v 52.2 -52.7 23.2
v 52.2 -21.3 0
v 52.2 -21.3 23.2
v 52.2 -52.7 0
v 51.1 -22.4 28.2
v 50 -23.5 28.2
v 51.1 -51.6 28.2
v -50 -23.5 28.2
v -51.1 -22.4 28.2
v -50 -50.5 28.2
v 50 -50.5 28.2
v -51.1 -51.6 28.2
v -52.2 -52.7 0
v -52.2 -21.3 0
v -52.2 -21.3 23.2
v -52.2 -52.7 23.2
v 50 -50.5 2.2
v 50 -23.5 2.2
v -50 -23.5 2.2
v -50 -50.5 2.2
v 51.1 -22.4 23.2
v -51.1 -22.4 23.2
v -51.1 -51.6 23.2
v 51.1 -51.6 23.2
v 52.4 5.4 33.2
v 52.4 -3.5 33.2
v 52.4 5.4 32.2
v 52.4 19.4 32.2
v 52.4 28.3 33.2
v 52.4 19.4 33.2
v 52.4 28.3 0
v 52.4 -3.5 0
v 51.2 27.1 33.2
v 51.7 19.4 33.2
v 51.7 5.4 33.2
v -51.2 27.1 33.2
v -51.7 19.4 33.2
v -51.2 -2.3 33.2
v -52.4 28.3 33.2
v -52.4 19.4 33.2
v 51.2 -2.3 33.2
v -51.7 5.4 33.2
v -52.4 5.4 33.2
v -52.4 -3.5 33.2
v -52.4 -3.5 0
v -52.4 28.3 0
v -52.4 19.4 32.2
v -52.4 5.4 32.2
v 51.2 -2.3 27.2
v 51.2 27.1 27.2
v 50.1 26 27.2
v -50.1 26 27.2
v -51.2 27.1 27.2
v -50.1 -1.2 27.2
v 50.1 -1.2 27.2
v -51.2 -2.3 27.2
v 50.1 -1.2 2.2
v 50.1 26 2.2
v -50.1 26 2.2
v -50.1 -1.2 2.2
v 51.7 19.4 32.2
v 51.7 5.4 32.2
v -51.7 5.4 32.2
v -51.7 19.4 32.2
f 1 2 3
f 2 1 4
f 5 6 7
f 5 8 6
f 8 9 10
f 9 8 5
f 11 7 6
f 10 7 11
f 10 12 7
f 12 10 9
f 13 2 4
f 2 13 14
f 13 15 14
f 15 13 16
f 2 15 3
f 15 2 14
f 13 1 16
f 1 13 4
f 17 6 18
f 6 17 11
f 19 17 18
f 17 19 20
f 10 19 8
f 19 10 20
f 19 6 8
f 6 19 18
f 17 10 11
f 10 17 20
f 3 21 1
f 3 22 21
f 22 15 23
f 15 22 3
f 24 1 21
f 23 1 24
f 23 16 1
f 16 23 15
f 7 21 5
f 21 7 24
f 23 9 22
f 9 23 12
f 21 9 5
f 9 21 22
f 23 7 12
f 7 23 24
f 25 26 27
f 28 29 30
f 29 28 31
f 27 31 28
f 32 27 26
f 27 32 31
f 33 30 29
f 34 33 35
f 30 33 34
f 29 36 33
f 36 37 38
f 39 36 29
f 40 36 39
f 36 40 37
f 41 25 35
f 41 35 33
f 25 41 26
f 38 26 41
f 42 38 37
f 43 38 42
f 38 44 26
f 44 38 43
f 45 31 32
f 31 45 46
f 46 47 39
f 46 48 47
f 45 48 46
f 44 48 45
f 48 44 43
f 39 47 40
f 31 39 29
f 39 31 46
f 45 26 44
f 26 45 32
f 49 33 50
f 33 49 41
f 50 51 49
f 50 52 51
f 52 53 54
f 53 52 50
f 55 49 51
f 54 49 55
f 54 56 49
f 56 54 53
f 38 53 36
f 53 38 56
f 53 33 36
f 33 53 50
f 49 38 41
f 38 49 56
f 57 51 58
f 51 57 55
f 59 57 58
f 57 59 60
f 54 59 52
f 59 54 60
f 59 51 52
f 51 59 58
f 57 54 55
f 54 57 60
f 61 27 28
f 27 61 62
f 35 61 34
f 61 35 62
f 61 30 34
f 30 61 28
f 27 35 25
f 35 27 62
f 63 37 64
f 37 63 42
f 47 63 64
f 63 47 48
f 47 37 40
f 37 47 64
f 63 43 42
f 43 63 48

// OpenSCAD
offset=10;

inner_dim_x=100;
inner_dim_y=27;
inner_dim_z=26;
wall_thickness=2.2;

shoulder_thickness=1;
shoulder_height=5;
cover_height_without_shoulder=25;
cover_height=shoulder_height+cover_height_without_shoulder;
spacing=0.2;
spacing_vertical=1;



Assembly();

module Assembly(){
    translate([0,-inner_dim_y-offset,0]) Box();
    translate([0,inner_dim_y+offset,0]) Box_Cover();
}
module Box(){
    translate([0,0,(inner_dim_z+wall_thickness)/2])
    difference(){
    difference(){
            cube ([inner_dim_x+(2*wall_thickness),inner_dim_y+(2*wall_thickness),inner_dim_z+wall_thickness], center= true);
            
        Inner_Cube();
        }
    Outer_Shoulder();
    }
}
    
module Inner_Cube(){
    translate ([0,0,wall_thickness/2]) cube ([inner_dim_x,inner_dim_y,inner_dim_z], center= true);
    }
    
module Outer_Shoulder(){
    translate ([0,0,(((inner_dim_z+wall_thickness)/2)-shoulder_height/2)])
    difference(){
        cube ([inner_dim_x+(2*wall_thickness),inner_dim_y+(2*wall_thickness),shoulder_height], center= true);
        cube ([inner_dim_x+wall_thickness,inner_dim_y+wall_thickness,shoulder_height], center= true);
        }
}
    
module Box_Cover(){
    translate([0,-((inner_dim_y+wall_thickness)/2)-10,(cover_height+wall_thickness+spacing_vertical)/2]){
        difference(){
            difference(){
                difference(){
                    cube ([inner_dim_x+(2*wall_thickness)+2*spacing,inner_dim_y+(2*wall_thickness)+2*spacing,cover_height+wall_thickness+spacing_vertical], center= true);
                    translate ([0,0,wall_thickness/2+(cover_height-shoulder_height)/2]) cube ([inner_dim_x+wall_thickness+spacing,inner_dim_y+wall_thickness+spacing,shoulder_height+spacing_vertical], center= true);
                    translate ([0,0,wall_thickness/2]) cube ([inner_dim_x+spacing,inner_dim_y+spacing,cover_height+spacing_vertical], center= true);
                }
                color("red") translate([(inner_dim_x)/2+wall_thickness,0,(cover_height+spacing_vertical)/2+1]) cube([1,14,1.8],center=true);
            }
            color("red") translate([-((inner_dim_x)/2+wall_thickness),0,(cover_height+spacing_vertical)/2+1]) cube([1,14,1.8],center=true);
        }
    }
}
